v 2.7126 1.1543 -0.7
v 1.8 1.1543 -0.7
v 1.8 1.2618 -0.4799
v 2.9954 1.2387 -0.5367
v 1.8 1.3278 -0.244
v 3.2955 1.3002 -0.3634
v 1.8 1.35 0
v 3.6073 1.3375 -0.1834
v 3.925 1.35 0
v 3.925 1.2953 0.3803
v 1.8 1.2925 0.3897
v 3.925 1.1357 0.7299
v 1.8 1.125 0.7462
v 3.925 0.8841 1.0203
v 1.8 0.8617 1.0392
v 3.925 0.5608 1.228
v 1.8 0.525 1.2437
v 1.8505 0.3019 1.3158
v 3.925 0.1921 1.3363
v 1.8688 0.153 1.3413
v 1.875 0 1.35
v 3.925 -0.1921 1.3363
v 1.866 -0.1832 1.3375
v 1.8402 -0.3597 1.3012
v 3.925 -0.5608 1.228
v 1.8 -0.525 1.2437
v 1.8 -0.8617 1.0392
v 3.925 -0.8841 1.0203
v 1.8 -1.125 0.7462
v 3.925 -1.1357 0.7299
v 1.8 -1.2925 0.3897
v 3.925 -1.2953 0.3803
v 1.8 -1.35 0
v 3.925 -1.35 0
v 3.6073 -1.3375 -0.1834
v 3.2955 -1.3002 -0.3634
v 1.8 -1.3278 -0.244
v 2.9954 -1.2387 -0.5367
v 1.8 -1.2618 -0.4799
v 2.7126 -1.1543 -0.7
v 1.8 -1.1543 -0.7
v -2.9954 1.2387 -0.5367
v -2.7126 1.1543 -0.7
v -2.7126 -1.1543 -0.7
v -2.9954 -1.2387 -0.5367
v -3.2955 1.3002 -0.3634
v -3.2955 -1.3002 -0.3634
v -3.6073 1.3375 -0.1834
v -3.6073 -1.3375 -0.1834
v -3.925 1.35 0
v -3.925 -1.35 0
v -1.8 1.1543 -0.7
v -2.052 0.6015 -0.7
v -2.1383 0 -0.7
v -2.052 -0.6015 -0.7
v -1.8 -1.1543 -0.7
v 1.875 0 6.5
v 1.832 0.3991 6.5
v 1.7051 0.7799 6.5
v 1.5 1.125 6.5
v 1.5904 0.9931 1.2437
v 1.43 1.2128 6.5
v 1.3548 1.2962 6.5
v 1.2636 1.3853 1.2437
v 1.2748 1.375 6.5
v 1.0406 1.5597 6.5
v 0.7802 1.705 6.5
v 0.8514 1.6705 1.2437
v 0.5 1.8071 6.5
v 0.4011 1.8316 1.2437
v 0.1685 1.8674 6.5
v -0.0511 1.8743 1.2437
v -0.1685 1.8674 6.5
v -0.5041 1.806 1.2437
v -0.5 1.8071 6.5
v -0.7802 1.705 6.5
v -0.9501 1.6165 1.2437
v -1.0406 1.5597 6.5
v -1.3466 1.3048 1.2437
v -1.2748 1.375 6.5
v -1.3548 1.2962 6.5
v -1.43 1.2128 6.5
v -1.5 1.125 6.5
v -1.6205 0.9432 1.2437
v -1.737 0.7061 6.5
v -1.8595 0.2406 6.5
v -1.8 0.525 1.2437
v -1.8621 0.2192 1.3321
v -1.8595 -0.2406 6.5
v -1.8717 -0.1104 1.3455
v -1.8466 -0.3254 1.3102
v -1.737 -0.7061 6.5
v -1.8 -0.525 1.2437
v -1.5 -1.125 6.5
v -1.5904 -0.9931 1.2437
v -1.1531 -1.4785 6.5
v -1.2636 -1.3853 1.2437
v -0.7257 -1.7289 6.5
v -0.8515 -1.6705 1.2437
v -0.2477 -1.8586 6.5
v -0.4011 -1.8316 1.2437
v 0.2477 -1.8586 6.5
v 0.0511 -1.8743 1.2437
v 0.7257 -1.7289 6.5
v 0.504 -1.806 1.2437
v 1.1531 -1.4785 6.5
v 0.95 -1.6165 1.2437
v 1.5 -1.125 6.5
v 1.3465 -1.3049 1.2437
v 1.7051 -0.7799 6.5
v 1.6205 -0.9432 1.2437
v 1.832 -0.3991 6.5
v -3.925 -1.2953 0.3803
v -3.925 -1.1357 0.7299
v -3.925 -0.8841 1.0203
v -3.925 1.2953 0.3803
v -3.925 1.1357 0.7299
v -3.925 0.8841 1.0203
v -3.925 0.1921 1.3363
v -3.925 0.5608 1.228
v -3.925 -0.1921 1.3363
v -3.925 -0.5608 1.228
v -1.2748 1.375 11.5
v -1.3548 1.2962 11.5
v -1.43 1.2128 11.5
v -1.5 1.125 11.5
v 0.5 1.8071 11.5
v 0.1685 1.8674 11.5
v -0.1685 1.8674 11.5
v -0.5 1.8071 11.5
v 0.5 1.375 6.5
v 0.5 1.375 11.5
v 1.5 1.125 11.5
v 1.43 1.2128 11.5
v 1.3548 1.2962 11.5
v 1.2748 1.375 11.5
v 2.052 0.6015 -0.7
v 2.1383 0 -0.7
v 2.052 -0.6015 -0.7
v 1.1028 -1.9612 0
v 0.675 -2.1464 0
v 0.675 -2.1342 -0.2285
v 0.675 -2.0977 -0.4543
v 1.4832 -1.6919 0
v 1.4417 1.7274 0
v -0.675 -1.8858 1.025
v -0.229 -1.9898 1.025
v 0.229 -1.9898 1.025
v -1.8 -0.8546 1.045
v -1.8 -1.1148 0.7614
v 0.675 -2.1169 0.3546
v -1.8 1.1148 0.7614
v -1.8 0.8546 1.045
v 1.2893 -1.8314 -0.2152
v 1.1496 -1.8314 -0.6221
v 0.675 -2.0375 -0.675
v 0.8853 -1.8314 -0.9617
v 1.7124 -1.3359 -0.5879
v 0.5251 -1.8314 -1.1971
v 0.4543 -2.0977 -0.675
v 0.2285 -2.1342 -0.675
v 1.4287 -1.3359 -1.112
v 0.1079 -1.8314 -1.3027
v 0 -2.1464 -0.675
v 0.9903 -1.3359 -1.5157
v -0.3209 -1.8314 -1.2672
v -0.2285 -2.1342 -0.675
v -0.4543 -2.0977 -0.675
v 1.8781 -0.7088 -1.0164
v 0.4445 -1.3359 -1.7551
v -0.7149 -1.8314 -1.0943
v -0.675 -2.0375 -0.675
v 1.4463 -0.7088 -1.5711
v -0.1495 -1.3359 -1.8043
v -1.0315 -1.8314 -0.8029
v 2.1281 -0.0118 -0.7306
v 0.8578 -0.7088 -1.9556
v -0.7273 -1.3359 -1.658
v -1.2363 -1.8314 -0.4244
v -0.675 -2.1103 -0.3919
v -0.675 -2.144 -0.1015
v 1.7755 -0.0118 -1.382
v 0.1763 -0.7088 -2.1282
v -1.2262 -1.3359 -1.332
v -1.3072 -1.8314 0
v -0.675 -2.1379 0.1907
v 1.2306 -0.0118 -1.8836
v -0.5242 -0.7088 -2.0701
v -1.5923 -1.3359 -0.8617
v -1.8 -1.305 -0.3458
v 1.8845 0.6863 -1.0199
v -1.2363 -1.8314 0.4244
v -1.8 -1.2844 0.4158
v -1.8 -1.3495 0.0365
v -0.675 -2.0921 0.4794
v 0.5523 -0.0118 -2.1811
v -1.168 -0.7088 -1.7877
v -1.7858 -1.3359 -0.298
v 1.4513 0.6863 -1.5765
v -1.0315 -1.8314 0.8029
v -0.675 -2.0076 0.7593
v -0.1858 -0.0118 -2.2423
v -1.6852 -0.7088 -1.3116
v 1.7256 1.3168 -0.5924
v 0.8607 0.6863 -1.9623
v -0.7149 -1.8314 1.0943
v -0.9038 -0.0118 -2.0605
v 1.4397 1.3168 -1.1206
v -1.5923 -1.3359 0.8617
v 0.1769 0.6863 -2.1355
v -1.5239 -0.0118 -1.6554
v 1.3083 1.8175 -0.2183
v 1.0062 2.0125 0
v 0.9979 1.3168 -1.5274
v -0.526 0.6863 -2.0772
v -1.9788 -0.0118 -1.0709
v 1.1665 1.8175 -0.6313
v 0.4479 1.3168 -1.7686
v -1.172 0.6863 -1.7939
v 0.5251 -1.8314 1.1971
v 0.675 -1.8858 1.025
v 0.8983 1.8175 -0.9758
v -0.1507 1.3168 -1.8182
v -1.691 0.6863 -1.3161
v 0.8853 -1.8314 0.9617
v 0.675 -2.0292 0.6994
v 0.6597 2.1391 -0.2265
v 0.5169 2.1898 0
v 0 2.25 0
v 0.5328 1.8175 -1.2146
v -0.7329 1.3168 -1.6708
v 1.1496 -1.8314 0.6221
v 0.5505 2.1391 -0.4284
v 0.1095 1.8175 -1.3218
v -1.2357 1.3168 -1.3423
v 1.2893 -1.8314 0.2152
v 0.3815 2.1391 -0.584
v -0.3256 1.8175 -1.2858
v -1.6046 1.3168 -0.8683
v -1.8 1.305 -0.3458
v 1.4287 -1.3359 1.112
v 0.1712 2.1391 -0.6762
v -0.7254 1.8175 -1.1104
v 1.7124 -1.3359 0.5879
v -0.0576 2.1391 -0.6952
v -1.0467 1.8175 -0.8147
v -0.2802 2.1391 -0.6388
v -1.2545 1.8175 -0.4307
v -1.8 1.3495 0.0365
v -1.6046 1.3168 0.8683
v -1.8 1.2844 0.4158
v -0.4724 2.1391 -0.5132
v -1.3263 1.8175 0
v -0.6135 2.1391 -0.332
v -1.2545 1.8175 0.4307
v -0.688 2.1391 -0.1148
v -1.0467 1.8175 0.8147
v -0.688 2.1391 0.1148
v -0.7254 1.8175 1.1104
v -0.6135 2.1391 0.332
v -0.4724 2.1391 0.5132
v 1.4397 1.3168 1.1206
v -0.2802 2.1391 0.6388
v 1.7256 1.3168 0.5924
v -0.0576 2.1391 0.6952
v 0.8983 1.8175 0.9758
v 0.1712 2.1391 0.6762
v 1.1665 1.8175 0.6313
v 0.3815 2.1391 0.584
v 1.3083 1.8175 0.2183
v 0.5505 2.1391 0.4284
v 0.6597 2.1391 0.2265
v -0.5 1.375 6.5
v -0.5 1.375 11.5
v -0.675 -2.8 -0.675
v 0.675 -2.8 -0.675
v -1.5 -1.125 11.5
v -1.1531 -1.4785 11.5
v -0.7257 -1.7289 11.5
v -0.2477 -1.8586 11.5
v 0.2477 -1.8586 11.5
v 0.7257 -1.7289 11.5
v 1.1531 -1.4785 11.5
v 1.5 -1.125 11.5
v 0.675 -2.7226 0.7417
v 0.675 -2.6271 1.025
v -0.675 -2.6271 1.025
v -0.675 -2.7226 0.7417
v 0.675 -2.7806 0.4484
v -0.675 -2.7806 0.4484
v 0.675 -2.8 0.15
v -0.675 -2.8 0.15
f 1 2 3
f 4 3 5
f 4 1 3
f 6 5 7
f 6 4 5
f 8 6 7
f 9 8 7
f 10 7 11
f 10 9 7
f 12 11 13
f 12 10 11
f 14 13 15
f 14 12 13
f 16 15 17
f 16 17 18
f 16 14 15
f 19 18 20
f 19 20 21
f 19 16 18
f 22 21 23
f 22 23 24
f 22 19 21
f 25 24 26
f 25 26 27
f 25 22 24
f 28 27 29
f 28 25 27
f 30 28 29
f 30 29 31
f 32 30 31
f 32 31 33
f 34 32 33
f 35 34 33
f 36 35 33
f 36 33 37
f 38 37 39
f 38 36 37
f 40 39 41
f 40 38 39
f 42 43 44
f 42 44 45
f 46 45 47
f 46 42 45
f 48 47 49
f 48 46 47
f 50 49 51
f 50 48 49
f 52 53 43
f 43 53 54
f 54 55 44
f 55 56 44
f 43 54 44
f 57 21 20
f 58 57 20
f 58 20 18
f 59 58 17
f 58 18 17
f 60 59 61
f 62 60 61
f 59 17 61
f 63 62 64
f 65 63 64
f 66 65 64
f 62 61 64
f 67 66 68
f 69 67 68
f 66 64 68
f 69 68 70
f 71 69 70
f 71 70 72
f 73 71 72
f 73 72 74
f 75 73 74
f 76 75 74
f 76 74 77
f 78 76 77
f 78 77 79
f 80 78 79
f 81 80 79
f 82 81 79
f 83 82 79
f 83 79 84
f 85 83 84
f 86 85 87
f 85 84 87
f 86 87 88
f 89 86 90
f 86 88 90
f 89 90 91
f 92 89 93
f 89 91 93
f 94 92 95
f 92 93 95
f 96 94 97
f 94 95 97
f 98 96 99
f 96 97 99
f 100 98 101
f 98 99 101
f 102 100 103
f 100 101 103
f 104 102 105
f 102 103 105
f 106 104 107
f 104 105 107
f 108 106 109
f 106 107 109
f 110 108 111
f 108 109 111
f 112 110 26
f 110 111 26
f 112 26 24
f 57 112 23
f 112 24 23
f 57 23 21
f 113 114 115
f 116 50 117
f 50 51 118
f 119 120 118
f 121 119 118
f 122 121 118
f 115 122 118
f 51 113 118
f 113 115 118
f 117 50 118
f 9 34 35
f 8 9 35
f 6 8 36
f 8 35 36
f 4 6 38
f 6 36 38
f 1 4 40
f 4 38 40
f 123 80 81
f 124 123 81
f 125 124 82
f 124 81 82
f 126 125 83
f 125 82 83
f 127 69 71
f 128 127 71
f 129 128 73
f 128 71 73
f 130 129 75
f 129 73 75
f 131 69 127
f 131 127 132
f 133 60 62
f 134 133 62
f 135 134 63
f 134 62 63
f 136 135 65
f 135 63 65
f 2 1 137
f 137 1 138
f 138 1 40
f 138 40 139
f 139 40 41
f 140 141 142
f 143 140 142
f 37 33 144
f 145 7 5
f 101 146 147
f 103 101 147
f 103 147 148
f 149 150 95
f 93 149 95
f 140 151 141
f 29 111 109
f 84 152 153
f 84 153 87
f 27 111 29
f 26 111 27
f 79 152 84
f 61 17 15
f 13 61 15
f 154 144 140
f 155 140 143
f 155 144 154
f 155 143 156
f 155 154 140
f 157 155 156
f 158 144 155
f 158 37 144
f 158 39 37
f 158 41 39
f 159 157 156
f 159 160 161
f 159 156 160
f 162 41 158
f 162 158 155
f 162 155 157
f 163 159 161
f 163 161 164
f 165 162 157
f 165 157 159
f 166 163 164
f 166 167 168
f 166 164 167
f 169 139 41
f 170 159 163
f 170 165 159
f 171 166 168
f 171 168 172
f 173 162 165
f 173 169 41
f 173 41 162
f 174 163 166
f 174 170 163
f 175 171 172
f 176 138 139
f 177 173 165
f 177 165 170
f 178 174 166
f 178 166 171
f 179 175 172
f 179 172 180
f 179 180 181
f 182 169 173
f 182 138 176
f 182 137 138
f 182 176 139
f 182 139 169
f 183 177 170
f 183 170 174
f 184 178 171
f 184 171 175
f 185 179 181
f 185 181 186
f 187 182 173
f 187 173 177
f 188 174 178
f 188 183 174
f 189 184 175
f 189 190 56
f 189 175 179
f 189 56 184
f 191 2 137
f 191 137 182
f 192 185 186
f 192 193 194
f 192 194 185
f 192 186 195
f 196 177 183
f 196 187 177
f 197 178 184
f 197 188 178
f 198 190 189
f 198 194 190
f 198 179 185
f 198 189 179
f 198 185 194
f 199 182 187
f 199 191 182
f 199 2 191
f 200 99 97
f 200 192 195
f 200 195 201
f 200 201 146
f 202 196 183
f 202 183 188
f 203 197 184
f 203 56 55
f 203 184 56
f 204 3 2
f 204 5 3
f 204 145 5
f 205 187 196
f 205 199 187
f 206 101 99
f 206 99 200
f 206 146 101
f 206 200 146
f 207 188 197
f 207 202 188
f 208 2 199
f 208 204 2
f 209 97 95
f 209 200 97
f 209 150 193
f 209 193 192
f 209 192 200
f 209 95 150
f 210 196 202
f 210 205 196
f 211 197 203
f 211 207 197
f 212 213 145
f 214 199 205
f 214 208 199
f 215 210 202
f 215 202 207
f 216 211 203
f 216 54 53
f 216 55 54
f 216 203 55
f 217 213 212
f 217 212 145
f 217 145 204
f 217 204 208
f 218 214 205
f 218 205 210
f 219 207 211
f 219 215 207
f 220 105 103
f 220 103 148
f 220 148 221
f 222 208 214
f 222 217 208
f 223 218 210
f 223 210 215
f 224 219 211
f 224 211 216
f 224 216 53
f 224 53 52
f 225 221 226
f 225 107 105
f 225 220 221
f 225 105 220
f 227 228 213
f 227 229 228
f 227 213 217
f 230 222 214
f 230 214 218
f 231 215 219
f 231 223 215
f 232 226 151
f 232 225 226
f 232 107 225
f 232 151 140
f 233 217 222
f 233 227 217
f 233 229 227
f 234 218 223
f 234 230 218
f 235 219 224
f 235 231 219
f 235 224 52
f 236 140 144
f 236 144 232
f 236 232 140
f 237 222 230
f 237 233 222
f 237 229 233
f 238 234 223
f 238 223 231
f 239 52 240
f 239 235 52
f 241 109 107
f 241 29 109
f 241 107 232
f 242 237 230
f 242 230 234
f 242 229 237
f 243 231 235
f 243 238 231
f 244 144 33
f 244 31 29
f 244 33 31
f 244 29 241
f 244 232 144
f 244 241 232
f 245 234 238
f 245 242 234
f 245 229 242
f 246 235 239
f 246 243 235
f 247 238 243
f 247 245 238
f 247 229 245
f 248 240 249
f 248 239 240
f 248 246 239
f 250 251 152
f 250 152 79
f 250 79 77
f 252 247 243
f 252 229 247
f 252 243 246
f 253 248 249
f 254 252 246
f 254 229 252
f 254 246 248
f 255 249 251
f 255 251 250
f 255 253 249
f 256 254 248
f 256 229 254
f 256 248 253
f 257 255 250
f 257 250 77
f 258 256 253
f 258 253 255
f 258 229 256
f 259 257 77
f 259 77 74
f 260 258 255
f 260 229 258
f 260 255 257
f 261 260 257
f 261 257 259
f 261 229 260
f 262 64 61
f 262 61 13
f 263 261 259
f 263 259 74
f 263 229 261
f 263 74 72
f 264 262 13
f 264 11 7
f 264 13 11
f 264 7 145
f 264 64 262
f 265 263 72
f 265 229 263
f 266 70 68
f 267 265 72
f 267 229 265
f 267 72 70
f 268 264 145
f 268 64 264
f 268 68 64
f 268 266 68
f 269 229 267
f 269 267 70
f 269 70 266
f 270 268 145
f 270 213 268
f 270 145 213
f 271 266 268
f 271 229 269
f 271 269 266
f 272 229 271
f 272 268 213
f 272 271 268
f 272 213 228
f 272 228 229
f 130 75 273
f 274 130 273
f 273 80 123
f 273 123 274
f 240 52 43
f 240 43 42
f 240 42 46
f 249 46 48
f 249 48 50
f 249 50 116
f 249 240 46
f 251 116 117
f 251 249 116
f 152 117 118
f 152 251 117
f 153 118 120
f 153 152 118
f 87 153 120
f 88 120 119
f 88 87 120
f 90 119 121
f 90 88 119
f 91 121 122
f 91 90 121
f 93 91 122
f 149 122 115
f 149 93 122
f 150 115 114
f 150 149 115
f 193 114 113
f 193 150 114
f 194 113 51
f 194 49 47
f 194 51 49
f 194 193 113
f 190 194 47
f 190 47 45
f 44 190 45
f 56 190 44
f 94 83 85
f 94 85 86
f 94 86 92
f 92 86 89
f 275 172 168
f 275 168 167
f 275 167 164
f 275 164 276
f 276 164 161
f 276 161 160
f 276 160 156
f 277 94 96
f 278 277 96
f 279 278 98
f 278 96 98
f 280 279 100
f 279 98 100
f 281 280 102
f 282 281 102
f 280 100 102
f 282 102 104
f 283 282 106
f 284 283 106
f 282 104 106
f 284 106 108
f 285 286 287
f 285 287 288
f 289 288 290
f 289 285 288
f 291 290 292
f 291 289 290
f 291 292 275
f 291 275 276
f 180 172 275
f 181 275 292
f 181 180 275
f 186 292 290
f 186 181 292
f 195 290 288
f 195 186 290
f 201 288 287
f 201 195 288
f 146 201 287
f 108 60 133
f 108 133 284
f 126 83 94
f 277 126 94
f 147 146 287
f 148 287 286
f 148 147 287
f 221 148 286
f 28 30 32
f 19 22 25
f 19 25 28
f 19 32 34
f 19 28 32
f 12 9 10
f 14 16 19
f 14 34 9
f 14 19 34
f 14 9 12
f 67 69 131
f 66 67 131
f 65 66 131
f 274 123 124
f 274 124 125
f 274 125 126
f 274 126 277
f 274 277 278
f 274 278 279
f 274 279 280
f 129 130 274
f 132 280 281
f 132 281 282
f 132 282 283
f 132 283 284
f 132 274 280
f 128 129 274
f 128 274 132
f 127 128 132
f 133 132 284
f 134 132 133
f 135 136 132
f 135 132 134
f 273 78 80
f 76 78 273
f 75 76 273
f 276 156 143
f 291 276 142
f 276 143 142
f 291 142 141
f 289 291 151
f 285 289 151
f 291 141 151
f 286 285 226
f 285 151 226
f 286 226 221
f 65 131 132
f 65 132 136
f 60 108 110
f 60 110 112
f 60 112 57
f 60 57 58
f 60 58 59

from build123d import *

# Parameters (mm, degrees)
SKETCH001_R          = 1.875
PAD_DEPTH            = 6.5
PAD002_DEPTH         = 5
SKETCH002_R          = 1.35
PAD001_DEPTH         = 3.925
POCKET_DEPTH         = 1.876
POCKET_DEPTH_BACK    = 1.876
SKETCH005_W          = 1.35
SKETCH005_H          = 1.7
PAD003_DEPTH         = 2.8
POCKET001_DEPTH      = 3.926
POCKET001_DEPTH_BACK = 3.926


with BuildPart() as part:
    # Sketch001 → Pad (new body)
    with BuildSketch(Plane.XY):
        Circle(SKETCH001_R)
    extrude(amount=PAD_DEPTH)

    # Sketch003 → Pad002 (join)
    with BuildSketch(Plane.XY.offset(6.5)):
        with BuildLine():
            ThreePointArc((1.5, 1.125), (1.392997, 1.255063), (1.274755, 1.375))
            Line((0.5, 1.375), (1.274755, 1.375))
            Line((0.5, 1.807104), (0.5, 1.375))
            ThreePointArc((0.5, 1.807104), (0, 1.875), (-0.5, 1.807104))
            Line((-0.5, 1.807104), (-0.5, 1.375))
            Line((-1.274755, 1.375), (-0.5, 1.375))
            ThreePointArc((-1.274755, 1.375), (-1.392997, 1.255063), (-1.5, 1.125))
            Line((-1.5, 1.125), (-1.5, -1.125))
            ThreePointArc((-1.5, -1.125), (0, -1.875), (1.5, -1.125))
            Line((1.5, 1.125), (1.5, -1.125))
        make_face()
    extrude(amount=PAD002_DEPTH)

    # Sketch002 → Pad001 (join, symmetric)
    with BuildSketch(Plane.YZ):
        Circle(SKETCH002_R)
    extrude(amount=PAD001_DEPTH, both=True)

    # Sketch004 → Pocket (cut, two sides)
    with BuildSketch(Plane.XZ) as pocket_sk:
        Polygon((-3.925, 0), (-3.925, -3), (3.925, -3), (3.925, 0), (2.712564, -0.7), (-2.712564, -0.7), align=None)
    extrude(amount=-POCKET_DEPTH, mode=Mode.SUBTRACT)
    extrude(pocket_sk.sketch, amount=POCKET_DEPTH_BACK, mode=Mode.SUBTRACT)

    # Sketch → Revolution (revolve)
    with BuildSketch(Plane.XY):
        with BuildLine():
            ThreePointArc((0, -2.25), (2.25, 0), (0, 2.25))
            Line((0, 2.25), (0, -2.25))
        make_face()
    revolve(axis=Axis((0, 0, 0), (0, 1, 0)))

    # Sketch005 → Pad003 (join)
    with BuildSketch(Plane.XZ):
        with Locations((0, 0.175)):
            Rectangle(SKETCH005_W, SKETCH005_H)
    extrude(amount=PAD003_DEPTH)

    # Sketch006 → Pocket001 (cut, two sides)
    with BuildSketch(Plane.YZ) as pocket001_sk:
        with BuildLine():
            Line((-2.8, 0.15), (-3.062142, 0.15))
            Line((-3.062142, 0.15), (-3.062142, 1.35))
            Line((-3.062142, 1.35), (-2.462142, 1.35))
            ThreePointArc((-2.462142, 1.35), (-2.713925, 0.773327), (-2.8, 0.15))
        make_face()
    extrude(amount=-POCKET001_DEPTH, mode=Mode.SUBTRACT)
    extrude(pocket001_sk.sketch, amount=POCKET001_DEPTH_BACK, mode=Mode.SUBTRACT)


solid = part.part
